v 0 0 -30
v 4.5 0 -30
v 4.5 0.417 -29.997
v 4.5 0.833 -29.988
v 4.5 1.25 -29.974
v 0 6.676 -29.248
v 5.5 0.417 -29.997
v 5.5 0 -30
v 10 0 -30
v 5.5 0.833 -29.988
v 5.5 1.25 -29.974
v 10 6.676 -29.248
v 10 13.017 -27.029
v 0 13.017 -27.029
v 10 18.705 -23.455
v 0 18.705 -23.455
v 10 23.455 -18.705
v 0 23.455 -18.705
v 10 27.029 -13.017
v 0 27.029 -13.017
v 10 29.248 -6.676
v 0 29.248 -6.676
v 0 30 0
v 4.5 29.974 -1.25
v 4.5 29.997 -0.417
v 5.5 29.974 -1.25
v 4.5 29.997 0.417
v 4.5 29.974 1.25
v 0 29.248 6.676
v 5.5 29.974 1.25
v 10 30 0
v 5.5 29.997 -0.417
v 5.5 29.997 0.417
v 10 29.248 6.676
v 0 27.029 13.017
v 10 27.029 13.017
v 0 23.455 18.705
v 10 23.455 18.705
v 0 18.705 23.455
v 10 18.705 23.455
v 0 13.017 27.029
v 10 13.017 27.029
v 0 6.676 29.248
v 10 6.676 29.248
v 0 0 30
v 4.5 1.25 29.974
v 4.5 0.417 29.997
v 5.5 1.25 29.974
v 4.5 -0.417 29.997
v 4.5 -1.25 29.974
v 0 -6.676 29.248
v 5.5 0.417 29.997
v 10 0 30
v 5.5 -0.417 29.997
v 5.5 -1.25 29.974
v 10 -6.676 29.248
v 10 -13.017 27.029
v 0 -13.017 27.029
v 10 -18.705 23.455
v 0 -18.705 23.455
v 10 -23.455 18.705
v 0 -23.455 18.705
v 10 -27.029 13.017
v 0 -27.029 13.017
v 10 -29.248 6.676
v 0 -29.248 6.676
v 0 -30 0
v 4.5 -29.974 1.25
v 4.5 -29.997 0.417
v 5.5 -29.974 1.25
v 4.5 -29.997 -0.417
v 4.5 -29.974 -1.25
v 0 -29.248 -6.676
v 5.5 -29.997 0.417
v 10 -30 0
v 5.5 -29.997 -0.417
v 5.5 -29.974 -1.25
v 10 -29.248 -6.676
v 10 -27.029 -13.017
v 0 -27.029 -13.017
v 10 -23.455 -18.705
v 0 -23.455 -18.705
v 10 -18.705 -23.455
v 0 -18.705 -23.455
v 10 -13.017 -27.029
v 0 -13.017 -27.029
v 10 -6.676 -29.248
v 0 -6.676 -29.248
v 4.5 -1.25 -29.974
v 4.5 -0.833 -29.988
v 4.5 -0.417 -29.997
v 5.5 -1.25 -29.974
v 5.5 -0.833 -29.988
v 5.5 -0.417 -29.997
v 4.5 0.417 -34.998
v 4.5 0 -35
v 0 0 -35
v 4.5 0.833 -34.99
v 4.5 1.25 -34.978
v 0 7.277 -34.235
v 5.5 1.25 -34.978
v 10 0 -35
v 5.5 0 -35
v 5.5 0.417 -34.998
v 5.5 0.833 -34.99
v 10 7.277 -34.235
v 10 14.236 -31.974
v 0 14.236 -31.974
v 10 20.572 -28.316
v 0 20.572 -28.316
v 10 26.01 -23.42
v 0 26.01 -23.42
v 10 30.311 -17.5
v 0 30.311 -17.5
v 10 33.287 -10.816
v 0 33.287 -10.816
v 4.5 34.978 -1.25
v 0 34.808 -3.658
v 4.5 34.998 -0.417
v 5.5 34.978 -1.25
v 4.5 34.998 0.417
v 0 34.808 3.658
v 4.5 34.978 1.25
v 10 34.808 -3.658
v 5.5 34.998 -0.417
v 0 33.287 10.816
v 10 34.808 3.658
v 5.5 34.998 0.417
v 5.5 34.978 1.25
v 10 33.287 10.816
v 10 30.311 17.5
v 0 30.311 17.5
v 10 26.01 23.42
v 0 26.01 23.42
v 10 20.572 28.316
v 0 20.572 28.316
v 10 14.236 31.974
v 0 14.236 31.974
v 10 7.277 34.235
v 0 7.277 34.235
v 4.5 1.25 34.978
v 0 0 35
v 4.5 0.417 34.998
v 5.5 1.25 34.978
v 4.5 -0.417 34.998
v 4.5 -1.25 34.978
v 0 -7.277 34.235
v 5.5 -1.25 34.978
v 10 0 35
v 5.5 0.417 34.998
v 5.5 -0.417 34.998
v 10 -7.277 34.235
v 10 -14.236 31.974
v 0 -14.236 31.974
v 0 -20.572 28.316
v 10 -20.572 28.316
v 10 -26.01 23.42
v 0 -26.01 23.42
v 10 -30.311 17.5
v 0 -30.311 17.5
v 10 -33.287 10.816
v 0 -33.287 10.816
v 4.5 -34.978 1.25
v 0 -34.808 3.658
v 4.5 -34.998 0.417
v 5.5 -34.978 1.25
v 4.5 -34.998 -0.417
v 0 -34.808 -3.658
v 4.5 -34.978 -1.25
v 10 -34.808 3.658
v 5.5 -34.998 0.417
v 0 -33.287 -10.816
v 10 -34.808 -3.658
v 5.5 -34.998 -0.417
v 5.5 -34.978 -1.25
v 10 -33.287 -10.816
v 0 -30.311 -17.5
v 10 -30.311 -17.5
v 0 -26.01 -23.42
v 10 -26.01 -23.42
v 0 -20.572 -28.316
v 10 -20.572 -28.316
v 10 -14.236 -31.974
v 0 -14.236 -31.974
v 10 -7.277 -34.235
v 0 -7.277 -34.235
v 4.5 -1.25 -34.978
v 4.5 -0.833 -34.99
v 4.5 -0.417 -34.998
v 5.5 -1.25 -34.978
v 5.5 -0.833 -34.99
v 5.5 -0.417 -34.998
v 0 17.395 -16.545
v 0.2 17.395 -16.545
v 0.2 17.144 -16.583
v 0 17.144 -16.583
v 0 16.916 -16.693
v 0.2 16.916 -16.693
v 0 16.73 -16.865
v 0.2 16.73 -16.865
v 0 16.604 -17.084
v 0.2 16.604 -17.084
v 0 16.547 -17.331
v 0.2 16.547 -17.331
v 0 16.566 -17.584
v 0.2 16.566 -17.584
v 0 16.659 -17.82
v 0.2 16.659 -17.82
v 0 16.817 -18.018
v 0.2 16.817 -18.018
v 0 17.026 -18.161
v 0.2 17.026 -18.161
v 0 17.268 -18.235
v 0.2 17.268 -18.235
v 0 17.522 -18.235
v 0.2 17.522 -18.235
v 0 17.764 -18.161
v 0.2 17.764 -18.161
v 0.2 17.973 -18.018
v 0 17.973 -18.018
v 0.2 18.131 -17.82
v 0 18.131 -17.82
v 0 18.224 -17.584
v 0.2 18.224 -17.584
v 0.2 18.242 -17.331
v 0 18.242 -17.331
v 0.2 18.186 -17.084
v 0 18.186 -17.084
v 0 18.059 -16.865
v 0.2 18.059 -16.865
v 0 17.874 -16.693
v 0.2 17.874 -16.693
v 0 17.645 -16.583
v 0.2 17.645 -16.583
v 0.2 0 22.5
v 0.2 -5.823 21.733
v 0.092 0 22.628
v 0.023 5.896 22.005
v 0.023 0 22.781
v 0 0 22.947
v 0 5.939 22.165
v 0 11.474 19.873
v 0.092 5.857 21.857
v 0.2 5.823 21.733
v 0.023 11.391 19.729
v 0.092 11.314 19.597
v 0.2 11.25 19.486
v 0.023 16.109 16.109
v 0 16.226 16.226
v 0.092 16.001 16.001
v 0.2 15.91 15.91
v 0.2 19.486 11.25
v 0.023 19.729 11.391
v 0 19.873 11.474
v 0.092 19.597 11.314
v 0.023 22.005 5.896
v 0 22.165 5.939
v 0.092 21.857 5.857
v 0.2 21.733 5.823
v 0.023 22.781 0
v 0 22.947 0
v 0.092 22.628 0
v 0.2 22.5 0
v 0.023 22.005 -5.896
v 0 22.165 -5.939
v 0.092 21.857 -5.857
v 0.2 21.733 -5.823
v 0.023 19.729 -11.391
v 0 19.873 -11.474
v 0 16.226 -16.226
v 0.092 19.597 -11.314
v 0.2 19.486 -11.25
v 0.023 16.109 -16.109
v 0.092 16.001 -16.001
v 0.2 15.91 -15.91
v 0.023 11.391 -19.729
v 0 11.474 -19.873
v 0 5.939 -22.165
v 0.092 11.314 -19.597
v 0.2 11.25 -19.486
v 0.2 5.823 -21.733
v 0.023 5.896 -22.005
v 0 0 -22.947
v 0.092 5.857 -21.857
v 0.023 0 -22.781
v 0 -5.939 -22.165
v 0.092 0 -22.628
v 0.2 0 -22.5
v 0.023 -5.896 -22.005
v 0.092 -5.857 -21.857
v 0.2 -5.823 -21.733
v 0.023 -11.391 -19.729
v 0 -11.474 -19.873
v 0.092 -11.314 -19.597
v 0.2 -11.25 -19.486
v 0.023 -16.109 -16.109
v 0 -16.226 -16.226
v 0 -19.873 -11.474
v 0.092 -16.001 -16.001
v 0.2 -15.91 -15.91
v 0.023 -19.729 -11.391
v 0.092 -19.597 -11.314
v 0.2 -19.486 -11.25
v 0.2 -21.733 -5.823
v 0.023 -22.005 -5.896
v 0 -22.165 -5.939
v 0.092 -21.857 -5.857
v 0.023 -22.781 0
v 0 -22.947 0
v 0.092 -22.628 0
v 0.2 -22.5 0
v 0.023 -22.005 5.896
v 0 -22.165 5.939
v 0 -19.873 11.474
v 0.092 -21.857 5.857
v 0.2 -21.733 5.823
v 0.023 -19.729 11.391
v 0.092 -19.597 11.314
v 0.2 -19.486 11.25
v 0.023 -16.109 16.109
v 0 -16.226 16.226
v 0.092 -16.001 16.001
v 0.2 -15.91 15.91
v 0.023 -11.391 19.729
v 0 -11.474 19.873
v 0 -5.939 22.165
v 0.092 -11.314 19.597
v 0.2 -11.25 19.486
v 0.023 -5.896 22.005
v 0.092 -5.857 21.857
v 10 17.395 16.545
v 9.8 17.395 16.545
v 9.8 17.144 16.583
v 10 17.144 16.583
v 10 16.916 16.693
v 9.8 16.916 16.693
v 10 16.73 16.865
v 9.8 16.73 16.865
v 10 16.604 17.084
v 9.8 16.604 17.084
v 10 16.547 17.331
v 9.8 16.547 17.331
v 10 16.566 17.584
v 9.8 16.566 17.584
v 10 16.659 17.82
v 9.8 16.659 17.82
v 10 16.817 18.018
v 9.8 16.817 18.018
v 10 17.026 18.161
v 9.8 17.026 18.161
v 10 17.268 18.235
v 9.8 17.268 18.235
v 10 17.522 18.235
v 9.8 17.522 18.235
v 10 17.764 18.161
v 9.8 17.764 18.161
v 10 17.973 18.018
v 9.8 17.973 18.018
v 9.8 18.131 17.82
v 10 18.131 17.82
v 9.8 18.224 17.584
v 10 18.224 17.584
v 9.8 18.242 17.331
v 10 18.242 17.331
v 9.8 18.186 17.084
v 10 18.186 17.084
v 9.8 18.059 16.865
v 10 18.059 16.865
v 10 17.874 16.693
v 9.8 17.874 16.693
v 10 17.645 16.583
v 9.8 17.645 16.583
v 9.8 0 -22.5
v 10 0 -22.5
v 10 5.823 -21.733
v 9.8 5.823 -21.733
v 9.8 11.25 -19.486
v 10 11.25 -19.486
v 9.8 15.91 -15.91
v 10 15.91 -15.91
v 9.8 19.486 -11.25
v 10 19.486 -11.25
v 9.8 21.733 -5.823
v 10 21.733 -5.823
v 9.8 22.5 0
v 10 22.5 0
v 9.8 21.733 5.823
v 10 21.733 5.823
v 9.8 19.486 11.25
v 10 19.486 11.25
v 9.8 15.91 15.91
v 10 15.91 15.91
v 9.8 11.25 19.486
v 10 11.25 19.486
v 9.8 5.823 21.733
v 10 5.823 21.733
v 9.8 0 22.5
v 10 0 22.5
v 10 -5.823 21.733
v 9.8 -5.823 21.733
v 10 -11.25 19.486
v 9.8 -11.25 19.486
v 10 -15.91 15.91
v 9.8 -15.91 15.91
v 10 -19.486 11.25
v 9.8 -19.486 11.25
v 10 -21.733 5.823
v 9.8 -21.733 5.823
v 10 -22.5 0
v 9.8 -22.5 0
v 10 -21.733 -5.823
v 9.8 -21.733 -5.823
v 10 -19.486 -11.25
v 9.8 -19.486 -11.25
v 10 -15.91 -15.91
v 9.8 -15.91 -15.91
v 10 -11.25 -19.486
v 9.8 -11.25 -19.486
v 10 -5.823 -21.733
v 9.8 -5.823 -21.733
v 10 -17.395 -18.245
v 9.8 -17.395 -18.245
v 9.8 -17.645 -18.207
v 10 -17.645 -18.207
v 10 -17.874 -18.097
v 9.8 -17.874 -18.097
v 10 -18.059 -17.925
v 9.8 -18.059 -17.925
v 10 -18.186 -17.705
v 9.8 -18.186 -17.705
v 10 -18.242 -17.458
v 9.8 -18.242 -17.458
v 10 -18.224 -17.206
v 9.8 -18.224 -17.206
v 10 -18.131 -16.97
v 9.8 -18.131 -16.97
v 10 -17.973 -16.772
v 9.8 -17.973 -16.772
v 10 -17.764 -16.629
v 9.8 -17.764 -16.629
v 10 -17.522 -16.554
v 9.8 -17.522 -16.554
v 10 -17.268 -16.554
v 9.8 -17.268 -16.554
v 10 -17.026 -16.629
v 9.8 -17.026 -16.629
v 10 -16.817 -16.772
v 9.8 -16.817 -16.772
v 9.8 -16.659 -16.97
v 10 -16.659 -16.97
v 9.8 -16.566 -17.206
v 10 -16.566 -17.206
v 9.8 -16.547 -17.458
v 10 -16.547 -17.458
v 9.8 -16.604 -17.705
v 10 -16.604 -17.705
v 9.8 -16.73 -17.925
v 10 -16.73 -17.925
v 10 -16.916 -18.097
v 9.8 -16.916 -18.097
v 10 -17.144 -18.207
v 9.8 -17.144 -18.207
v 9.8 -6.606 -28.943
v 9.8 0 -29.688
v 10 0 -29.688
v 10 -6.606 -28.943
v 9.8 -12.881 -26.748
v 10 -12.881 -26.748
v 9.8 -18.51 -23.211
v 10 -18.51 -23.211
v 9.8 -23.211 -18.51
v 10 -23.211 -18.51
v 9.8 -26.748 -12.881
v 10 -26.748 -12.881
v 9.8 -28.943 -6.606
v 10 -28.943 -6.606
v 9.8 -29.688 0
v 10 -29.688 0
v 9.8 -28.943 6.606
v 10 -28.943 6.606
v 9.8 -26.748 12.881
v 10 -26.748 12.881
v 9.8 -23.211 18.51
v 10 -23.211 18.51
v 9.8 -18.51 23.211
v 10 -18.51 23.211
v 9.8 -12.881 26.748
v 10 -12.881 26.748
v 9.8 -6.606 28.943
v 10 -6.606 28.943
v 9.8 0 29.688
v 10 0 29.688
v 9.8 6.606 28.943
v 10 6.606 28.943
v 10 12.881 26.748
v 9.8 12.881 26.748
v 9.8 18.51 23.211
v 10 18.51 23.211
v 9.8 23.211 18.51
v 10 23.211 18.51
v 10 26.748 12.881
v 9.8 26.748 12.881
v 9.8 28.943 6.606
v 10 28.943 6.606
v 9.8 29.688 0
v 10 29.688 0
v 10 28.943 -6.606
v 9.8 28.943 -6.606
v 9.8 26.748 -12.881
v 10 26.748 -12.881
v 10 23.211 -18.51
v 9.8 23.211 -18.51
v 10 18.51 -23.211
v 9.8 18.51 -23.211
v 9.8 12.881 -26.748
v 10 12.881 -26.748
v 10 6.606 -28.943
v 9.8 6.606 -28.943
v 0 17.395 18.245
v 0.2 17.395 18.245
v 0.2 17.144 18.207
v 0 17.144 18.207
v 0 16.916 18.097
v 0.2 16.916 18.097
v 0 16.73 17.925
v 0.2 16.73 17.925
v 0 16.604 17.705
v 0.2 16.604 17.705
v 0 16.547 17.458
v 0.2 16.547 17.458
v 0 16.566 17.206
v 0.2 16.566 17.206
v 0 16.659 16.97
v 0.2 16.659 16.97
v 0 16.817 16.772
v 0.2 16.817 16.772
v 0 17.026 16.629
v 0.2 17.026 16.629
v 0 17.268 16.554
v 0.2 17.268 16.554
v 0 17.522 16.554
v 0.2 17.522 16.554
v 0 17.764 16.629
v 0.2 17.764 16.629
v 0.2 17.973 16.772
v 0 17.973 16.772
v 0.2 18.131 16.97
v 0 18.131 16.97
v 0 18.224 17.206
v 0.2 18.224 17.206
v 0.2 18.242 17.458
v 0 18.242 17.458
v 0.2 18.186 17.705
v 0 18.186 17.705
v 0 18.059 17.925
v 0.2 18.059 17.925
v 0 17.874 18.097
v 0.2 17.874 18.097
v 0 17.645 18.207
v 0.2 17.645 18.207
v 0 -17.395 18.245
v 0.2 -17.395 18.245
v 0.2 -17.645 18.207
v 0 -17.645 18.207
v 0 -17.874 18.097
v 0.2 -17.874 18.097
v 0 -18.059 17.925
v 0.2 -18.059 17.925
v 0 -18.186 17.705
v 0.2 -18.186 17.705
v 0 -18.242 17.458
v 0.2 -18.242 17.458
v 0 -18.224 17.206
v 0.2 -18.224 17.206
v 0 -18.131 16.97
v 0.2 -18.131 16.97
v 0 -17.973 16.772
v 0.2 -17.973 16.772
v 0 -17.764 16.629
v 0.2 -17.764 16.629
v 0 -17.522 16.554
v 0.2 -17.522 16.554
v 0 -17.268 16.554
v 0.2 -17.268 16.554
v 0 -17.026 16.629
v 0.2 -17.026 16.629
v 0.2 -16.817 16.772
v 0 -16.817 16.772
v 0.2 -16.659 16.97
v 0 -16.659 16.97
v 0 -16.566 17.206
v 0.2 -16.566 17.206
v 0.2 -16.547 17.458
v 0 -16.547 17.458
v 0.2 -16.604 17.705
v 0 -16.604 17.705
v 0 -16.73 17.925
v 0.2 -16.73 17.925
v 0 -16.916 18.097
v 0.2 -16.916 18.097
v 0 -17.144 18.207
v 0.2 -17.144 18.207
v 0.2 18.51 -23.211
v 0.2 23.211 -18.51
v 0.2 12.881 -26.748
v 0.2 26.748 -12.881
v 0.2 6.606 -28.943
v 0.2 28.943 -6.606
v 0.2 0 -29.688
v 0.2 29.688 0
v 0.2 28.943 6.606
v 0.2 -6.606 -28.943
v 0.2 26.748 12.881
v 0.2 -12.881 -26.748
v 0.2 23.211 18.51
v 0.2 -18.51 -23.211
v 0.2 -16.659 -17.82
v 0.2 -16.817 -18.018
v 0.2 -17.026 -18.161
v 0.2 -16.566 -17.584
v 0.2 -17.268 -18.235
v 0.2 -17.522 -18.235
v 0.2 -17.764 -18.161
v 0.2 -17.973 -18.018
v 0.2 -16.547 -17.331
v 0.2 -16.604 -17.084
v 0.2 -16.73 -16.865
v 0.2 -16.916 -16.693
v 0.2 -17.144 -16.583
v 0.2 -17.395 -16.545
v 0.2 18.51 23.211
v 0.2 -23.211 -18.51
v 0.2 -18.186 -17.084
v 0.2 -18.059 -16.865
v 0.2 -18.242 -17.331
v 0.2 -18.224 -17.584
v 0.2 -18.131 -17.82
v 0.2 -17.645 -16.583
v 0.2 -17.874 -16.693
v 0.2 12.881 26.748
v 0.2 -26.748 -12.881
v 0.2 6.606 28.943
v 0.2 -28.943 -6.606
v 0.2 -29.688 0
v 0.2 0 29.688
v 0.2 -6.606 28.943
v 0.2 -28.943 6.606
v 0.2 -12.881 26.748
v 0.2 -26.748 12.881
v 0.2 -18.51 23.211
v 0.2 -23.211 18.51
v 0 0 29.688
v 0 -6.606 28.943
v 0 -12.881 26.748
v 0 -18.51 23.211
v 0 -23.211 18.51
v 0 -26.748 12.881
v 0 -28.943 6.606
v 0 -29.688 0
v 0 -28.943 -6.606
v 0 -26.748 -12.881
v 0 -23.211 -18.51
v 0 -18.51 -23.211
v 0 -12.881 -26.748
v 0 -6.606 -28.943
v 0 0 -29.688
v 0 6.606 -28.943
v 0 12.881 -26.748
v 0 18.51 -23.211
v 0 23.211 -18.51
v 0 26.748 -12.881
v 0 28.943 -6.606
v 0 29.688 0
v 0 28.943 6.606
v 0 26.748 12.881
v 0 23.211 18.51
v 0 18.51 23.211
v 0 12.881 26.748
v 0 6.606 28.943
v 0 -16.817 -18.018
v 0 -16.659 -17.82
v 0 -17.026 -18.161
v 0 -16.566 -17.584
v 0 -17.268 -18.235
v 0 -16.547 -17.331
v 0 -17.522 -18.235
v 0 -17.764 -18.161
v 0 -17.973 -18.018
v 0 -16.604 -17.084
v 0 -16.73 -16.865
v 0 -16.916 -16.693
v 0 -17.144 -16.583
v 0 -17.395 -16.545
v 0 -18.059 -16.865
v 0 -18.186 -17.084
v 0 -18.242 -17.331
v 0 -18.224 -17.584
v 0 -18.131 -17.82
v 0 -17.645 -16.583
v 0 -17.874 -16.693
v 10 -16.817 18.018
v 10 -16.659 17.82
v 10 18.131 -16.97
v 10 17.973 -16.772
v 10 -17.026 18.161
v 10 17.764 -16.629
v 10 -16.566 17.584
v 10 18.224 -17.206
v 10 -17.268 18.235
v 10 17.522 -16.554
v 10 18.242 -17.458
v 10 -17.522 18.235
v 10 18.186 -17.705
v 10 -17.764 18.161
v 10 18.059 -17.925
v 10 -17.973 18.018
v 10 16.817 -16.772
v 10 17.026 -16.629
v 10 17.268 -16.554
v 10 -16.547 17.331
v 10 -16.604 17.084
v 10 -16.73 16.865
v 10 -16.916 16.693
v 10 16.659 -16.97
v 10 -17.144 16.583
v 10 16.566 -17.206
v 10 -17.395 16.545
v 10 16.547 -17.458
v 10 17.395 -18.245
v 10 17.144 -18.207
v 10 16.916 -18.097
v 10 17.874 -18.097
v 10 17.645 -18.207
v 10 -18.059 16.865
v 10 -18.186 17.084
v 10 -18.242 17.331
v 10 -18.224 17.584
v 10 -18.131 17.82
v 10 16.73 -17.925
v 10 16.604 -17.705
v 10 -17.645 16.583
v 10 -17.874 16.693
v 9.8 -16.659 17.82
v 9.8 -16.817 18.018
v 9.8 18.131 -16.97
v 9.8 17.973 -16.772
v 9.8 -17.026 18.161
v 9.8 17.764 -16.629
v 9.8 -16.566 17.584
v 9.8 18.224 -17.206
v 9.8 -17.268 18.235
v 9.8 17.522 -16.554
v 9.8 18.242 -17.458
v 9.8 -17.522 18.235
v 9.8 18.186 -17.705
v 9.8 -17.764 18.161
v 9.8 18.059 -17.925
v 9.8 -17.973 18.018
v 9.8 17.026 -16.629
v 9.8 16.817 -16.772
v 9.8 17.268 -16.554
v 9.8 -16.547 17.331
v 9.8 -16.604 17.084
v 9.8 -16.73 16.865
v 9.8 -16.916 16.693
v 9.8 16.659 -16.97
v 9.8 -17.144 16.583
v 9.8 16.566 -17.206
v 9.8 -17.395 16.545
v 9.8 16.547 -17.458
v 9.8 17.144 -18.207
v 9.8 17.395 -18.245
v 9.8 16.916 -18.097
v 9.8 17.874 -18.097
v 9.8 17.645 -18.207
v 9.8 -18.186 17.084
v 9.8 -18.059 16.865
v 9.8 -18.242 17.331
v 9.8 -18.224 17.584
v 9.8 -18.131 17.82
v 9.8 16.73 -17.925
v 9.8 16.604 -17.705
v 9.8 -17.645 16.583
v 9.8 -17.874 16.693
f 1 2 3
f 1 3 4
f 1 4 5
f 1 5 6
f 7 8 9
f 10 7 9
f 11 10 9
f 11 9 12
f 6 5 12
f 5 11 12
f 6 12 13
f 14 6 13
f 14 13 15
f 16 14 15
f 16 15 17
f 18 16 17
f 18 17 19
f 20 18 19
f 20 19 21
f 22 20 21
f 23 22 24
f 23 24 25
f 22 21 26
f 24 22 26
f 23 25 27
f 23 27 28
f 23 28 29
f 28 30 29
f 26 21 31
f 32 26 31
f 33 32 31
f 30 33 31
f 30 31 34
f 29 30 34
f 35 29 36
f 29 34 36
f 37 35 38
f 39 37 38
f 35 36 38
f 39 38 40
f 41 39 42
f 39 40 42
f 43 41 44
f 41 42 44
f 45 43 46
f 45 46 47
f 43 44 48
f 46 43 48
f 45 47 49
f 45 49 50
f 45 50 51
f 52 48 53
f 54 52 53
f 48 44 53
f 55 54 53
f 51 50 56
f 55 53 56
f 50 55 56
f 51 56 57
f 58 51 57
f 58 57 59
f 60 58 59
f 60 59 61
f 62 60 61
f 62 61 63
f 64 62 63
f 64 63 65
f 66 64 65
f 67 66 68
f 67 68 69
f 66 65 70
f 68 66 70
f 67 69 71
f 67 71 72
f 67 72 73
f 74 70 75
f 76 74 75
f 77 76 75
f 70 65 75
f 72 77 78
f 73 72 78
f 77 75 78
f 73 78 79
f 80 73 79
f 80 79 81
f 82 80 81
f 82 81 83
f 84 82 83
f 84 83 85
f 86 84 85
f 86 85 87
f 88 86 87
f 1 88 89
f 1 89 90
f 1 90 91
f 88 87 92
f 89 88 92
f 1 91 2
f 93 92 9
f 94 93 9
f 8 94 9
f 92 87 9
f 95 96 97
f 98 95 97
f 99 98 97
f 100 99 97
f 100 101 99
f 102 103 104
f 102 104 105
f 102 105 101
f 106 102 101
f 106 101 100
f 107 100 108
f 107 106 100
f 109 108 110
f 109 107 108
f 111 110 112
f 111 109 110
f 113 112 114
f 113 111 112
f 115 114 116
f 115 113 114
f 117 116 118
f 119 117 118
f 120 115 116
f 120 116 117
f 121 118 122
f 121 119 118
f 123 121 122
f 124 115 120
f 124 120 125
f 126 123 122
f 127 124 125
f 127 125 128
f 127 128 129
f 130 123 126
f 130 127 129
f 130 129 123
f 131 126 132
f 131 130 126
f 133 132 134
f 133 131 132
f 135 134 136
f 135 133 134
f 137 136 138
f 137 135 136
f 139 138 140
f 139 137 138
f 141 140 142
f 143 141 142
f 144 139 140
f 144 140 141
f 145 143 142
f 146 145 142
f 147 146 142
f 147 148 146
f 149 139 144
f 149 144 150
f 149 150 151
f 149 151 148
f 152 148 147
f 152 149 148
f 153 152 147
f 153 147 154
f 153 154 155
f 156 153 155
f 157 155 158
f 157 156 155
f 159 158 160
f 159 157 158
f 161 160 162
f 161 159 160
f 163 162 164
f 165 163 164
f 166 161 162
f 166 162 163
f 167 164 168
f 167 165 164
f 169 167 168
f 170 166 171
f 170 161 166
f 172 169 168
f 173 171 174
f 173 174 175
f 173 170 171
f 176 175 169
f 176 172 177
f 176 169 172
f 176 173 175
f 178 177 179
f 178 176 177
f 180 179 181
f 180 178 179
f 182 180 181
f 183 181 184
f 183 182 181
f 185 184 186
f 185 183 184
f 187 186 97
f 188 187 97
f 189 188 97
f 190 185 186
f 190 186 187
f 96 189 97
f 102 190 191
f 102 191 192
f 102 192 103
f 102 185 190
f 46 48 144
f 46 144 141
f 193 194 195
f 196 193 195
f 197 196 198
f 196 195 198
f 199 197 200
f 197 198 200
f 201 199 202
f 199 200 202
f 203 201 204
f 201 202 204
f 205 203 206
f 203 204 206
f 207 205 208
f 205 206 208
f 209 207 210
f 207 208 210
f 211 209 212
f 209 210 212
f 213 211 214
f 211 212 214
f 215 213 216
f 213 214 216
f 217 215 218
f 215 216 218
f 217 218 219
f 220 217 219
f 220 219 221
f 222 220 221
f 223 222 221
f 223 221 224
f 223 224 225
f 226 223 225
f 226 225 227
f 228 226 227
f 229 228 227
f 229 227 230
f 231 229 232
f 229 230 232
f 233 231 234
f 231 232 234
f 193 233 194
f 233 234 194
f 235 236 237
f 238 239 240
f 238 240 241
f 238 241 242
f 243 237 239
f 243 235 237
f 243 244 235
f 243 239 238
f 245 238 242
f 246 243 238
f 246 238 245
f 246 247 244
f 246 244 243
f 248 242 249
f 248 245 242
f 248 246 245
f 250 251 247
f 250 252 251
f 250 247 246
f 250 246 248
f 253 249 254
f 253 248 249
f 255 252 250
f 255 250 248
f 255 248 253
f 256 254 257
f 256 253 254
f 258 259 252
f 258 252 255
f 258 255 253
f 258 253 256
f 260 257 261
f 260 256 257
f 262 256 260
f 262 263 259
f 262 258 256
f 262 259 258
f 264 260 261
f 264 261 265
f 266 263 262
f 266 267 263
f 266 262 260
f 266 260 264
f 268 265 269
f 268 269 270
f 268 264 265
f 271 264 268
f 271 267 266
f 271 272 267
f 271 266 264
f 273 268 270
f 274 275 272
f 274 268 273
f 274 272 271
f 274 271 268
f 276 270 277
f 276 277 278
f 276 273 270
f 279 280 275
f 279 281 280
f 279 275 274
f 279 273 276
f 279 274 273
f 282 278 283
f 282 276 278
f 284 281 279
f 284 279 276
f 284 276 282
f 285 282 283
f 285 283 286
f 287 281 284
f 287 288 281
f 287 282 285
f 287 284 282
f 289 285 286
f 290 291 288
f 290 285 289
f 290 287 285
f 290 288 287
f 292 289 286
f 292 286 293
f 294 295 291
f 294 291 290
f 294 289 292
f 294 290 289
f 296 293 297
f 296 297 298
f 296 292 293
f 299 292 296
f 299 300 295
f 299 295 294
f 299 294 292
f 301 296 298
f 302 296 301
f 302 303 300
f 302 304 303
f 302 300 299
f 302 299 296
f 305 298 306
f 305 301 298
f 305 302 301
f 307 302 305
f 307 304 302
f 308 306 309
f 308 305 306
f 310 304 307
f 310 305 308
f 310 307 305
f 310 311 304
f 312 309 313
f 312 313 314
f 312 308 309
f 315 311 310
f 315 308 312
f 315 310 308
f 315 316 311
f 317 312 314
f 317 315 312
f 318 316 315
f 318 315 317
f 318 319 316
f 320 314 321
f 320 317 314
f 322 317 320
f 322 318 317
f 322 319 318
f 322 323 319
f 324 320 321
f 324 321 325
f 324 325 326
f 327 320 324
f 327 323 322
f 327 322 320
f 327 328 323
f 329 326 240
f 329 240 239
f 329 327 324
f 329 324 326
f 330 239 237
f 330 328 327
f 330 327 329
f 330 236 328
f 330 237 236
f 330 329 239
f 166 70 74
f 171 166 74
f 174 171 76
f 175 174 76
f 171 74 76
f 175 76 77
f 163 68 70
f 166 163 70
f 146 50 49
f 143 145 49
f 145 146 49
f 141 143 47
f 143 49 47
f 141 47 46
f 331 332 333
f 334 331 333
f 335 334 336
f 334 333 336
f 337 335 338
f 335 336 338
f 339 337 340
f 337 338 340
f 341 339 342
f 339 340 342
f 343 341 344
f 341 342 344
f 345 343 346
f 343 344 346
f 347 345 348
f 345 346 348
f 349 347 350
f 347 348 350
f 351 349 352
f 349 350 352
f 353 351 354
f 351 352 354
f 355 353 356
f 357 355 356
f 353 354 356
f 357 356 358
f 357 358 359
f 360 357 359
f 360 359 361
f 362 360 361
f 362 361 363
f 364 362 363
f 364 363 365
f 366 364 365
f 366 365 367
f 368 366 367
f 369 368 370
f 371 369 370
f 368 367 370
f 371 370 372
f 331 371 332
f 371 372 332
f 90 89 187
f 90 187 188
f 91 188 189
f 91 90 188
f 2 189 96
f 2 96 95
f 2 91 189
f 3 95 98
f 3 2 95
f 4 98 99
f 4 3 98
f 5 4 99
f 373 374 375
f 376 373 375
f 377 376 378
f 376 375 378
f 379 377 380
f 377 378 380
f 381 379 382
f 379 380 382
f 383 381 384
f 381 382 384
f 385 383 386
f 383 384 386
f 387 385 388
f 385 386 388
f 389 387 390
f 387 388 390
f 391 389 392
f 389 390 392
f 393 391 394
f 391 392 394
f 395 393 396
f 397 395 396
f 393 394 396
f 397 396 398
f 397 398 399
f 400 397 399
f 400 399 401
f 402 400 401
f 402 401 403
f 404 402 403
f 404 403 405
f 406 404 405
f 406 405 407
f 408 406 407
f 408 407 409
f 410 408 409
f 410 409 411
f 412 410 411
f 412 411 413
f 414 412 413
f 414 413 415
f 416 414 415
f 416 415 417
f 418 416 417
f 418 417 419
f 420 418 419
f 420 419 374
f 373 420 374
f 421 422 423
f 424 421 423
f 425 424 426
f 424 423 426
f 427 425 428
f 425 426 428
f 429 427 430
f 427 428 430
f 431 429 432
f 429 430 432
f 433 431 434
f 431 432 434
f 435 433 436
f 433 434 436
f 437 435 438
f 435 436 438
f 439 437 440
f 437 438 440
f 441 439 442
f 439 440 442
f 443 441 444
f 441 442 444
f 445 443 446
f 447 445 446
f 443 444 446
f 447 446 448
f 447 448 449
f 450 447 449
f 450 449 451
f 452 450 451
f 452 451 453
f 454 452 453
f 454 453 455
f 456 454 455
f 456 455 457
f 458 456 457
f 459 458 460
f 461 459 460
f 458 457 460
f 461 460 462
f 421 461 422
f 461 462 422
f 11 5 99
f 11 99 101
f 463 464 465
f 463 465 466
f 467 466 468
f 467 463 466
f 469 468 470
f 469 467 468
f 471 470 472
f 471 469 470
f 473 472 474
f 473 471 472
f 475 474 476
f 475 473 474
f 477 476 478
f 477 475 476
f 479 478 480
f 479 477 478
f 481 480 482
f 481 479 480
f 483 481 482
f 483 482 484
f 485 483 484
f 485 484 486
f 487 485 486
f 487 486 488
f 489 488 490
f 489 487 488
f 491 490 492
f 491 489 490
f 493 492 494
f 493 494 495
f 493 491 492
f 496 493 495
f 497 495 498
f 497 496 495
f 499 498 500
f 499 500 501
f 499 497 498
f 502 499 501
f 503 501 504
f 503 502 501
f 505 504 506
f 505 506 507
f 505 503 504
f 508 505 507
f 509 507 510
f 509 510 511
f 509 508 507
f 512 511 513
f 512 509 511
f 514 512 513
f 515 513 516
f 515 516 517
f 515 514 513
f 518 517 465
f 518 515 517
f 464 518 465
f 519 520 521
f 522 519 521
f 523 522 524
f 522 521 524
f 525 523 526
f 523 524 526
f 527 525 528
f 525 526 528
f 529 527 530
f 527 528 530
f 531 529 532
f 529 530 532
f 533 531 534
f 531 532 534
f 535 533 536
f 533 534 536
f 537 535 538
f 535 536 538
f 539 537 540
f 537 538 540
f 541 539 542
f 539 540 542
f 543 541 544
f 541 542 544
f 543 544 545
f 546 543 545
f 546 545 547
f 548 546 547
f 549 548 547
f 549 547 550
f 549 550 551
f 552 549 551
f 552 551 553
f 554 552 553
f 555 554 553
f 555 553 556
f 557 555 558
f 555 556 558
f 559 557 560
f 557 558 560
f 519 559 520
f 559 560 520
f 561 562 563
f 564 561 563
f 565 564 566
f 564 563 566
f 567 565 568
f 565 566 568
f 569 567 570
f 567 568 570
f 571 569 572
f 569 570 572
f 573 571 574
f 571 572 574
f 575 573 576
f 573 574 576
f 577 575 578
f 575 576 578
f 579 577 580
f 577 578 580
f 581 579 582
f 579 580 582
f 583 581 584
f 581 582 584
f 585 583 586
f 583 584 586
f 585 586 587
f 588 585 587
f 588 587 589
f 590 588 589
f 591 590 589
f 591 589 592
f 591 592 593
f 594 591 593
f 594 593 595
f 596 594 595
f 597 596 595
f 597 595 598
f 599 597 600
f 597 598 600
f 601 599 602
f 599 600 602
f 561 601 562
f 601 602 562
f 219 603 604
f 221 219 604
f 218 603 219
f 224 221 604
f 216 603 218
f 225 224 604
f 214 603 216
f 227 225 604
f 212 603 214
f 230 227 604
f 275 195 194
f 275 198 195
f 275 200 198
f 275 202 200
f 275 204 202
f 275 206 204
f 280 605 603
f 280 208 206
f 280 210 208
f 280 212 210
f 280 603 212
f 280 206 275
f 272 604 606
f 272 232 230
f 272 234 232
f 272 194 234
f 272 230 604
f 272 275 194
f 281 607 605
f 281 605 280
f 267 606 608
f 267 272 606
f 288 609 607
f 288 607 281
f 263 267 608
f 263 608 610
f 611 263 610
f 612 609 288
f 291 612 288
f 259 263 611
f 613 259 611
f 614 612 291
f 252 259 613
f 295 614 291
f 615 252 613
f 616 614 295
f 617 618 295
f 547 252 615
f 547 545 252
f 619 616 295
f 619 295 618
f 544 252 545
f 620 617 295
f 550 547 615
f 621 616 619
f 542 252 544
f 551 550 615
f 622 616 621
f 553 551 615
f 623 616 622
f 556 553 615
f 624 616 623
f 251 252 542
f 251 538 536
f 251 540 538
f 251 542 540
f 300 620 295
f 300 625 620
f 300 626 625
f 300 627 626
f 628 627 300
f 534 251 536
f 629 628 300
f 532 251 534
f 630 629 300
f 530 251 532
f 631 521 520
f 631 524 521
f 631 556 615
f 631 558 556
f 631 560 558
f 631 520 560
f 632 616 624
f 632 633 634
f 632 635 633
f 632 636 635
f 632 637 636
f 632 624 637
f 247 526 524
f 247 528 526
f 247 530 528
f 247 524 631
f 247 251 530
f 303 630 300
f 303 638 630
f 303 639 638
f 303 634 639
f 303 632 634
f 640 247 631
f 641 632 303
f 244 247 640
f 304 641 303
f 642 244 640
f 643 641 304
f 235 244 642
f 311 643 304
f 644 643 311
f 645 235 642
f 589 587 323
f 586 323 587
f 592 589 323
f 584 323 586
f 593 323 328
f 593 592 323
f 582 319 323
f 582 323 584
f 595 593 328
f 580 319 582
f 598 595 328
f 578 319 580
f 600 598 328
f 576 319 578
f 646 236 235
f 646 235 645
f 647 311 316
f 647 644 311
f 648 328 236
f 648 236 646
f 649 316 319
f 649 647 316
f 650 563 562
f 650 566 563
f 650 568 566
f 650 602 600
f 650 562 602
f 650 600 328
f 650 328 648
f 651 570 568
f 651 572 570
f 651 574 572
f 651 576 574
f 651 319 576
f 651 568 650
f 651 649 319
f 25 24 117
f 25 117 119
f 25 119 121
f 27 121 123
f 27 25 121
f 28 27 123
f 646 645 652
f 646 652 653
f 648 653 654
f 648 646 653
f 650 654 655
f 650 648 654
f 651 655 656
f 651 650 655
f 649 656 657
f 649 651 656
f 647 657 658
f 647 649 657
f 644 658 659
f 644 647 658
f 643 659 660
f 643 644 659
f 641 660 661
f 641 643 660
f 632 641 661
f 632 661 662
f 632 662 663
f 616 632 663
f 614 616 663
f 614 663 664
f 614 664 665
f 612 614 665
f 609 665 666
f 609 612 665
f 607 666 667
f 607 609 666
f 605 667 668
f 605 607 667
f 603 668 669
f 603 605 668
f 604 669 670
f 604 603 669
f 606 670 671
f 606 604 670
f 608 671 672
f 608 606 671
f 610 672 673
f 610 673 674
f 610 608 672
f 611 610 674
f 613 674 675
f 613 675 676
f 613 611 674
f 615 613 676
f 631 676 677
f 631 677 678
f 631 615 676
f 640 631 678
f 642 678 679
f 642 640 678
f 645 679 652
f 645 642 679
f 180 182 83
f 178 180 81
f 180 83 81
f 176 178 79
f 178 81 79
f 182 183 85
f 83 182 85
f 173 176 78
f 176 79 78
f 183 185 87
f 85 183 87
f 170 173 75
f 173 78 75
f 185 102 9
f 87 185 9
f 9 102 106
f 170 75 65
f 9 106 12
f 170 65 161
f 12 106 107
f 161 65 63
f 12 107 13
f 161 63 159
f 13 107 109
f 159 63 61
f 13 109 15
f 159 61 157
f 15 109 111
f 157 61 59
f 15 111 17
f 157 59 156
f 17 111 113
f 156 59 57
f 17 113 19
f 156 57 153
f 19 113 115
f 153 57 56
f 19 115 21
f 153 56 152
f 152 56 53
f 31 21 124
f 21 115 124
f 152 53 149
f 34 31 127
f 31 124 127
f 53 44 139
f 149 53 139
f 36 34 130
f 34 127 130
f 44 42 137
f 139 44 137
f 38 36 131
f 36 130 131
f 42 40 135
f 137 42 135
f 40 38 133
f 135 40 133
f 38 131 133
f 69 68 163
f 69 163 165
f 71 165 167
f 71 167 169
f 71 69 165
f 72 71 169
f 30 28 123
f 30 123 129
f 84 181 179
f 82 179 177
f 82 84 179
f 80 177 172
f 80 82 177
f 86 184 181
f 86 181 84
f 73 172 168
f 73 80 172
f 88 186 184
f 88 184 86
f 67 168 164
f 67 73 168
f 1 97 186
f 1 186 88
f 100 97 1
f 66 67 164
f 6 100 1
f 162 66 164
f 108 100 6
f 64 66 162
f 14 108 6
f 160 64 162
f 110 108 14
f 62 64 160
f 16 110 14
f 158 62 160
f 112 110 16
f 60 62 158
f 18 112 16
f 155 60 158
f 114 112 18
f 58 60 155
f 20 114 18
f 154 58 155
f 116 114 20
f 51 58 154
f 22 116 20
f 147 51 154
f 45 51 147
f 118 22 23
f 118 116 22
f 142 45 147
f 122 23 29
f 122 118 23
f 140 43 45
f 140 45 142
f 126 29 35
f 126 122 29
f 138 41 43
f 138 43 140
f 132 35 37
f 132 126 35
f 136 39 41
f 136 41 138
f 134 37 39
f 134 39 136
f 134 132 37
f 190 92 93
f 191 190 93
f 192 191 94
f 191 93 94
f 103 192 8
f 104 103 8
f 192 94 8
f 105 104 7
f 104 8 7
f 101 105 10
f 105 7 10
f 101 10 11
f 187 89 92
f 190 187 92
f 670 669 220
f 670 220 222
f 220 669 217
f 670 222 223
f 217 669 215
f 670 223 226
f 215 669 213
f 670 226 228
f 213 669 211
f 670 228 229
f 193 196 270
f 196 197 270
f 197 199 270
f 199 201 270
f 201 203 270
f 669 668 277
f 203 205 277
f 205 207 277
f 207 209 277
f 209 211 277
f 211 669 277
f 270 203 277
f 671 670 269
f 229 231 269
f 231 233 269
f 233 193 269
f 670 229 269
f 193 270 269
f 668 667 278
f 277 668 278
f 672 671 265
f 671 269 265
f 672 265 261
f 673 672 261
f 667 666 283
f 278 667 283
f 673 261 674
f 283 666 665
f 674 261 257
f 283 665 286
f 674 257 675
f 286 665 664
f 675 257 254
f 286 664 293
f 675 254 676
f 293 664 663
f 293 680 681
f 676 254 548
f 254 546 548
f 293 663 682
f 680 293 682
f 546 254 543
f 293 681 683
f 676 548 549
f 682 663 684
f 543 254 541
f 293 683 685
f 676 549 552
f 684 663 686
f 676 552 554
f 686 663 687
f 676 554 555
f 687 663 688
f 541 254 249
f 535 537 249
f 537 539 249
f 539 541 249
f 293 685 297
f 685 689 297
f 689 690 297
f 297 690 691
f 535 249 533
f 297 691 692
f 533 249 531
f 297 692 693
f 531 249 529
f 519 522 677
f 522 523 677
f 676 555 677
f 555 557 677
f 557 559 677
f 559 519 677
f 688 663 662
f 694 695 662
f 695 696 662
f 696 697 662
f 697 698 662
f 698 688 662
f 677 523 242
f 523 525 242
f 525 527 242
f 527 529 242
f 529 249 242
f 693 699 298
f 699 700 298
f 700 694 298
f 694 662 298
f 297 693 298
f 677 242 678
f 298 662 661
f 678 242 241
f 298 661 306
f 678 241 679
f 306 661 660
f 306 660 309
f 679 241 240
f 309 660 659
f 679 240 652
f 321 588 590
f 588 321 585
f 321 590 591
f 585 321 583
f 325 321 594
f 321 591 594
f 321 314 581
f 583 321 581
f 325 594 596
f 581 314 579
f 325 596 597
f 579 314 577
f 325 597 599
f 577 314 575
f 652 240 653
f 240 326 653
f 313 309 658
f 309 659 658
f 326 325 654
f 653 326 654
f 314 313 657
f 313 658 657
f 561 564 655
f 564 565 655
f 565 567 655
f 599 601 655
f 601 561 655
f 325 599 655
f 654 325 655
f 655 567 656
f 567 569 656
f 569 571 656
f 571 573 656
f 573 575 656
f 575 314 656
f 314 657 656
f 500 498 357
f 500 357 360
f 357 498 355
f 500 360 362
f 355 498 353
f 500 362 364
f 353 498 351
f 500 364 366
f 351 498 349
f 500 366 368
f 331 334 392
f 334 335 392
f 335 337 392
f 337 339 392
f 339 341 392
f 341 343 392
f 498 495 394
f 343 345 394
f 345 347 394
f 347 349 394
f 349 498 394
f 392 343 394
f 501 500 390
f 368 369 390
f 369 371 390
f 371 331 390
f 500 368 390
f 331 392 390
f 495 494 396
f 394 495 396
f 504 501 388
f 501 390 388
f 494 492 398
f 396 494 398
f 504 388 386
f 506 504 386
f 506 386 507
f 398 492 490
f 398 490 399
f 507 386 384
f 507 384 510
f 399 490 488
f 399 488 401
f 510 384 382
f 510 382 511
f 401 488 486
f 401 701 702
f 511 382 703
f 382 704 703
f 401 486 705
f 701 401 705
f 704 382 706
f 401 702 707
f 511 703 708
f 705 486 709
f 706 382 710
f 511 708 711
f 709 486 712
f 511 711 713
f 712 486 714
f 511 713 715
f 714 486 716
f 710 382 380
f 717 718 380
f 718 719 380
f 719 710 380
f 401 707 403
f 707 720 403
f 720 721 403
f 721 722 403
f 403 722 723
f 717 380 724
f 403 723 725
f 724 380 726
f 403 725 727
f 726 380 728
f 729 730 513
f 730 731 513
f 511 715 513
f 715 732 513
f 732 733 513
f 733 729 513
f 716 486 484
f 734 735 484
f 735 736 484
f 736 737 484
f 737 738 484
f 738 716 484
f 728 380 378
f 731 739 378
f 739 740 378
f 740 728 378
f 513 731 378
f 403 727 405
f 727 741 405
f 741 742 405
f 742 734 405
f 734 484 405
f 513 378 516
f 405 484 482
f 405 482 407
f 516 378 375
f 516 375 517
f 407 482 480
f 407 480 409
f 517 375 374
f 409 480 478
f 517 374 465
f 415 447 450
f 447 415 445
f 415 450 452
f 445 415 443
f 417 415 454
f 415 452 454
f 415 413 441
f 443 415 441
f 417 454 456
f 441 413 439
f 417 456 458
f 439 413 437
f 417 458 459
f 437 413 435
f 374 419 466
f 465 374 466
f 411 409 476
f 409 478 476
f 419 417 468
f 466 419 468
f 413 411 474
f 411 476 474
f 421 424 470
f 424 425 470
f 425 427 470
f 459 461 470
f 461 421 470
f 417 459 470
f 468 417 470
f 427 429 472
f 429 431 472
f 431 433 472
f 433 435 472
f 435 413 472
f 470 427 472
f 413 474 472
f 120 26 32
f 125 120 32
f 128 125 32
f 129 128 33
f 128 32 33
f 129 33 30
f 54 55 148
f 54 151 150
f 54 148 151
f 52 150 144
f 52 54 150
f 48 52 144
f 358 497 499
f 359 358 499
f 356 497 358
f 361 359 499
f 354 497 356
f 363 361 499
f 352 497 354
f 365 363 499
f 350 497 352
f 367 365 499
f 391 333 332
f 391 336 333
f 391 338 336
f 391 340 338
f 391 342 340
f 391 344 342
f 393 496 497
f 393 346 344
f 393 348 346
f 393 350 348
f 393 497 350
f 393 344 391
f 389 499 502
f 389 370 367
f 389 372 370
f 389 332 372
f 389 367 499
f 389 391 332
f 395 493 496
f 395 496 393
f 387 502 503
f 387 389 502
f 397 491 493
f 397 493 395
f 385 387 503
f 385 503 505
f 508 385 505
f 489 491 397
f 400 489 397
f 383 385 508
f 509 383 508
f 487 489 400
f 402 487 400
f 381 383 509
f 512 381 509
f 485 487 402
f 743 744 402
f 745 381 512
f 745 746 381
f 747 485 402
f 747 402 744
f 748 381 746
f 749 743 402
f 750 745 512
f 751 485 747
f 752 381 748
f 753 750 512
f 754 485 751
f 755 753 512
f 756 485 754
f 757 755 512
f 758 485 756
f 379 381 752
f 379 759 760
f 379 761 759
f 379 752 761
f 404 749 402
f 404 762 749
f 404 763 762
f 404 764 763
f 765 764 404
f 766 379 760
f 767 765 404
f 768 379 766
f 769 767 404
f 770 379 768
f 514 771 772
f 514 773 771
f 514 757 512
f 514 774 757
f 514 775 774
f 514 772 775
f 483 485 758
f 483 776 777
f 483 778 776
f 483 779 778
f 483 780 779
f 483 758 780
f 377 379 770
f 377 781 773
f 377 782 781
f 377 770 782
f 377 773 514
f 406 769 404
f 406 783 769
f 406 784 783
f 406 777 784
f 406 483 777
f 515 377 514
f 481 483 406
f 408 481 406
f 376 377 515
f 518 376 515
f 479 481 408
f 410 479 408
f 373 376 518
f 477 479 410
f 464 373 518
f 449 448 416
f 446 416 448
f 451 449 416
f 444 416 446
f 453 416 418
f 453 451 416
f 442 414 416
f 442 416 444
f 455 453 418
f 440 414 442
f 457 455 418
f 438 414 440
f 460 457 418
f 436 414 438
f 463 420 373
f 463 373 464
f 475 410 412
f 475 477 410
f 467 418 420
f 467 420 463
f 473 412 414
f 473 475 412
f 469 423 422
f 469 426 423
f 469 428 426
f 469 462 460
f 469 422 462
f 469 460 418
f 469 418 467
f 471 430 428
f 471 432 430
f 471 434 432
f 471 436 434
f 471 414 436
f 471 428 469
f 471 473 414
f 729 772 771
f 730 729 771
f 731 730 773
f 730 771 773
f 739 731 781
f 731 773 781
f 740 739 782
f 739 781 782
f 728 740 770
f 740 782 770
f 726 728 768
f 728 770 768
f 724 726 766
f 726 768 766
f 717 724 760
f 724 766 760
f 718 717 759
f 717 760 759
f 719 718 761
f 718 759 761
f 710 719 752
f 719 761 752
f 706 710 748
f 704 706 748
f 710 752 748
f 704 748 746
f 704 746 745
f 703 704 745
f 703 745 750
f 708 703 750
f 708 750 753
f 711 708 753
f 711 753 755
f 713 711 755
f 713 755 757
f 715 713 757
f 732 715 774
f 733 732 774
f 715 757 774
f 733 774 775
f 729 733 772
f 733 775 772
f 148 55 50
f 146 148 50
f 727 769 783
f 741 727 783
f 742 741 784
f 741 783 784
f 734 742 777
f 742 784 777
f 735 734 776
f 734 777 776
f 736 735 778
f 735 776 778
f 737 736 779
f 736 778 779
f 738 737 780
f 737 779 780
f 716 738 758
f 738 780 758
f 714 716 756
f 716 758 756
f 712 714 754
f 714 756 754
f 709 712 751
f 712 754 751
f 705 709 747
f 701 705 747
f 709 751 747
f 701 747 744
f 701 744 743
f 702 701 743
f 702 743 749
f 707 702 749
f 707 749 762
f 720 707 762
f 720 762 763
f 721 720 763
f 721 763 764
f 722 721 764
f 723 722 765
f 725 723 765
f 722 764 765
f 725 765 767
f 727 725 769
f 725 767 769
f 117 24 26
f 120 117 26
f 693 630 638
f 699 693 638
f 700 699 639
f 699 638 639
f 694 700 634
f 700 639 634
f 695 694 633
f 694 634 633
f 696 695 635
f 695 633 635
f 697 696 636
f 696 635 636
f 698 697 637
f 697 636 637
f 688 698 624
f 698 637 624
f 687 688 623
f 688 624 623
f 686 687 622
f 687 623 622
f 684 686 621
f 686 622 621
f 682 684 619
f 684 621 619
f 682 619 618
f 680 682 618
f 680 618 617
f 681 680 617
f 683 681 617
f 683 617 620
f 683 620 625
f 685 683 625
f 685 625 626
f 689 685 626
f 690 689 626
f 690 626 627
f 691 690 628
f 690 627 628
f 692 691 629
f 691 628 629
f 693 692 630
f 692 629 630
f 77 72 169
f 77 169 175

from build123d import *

# Parameters (mm, degrees)
SKETCH_1_W                       = 10
SKETCH_1_H                       = 35
HOLE_WIZARD_M52_1_D              = 60
SKETCH_4_R                       = 29.6875
EXTRUDE_1_DEPTH                  = 0.2
SKETCH_6_R                       = 29.6875
EXTRUDE_2_DEPTH                  = 0.2
SKETCH_7_R                       = 22.5
CUT_EXTRUDE_1_DEPTH              = 3.333333333
SKETCH_10_R                      = 22.5
CUT_EXTRUDE_4_DEPTH              = 3.333333333
CUT_EXTRUDE_5_REACH              = 73.609
CUT_EXTRUDE_5_END_RADIUS         = 35
SKETCH_11_W                      = 1
SKETCH_11_H                      = 2.5
CUT_EXTRUDE_6_REACH              = 73.609
CUT_EXTRUDE_6_END_RADIUS         = 35
SKETCH_12_W                      = 1
SKETCH_12_H                      = 2.5
CUT_EXTRUDE_7_REACH              = 73.609
CUT_EXTRUDE_7_END_RADIUS         = 35
SKETCH_13_W                      = 1
SKETCH_13_H                      = 2.5
CUT_EXTRUDE_8_REACH              = 73.609
CUT_EXTRUDE_8_END_RADIUS         = 35
SKETCH_14_W                      = 1
SKETCH_14_H                      = 2.5
SKETCH_15_W                      = 0.85
SKETCH_15_H                      = 0.85
HOLE_WIZARD_1_7_1_7_1_AT_2_COUNT = 2
HOLE_WIZARD_1_7_1_7_1_AT_2_PITCH = 34.789653634
HOLE_WIZARD_1_7_1_7_1_AT_3_COUNT = 2
HOLE_WIZARD_1_7_1_7_1_AT_3_PITCH = 49.2
HOLE_WIZARD_1_7_1_7_1_AT_4_COUNT = 2
HOLE_WIZARD_1_7_1_7_1_AT_4_PITCH = 34.789653634
SKETCH_17_W                      = 0.85
SKETCH_17_H                      = 0.85
HOLE_WIZARD_1_7_1_7_2_AT_2_COUNT = 2
HOLE_WIZARD_1_7_1_7_2_AT_2_PITCH = 34.789653634
HOLE_WIZARD_1_7_1_7_2_AT_3_COUNT = 2
HOLE_WIZARD_1_7_1_7_2_AT_3_PITCH = 49.2
HOLE_WIZARD_1_7_1_7_2_AT_4_COUNT = 2
HOLE_WIZARD_1_7_1_7_2_AT_4_PITCH = 34.789653634
FILLET_2_R                       = 0.6


with BuildPart() as part:
    # 草图1 → 旋转1 (revolve)
    with BuildSketch(Plane.XY, mode=Mode.PRIVATE) as revolve_1_sk:
        with Locations((5, 17.5)):
            Rectangle(SKETCH_1_W, SKETCH_1_H)
    revolve(revolve_1_sk.sketch.rotate(Axis((0, 0, 0), (1, 0, 0)), 270), axis=Axis((0, 0, 0), (1, 0, 0)))

    # M52 间隙孔1 (through all)
    with Locations(Plane.ZY):
        with Locations((0, 0)):
            Hole(HOLE_WIZARD_M52_1_D / 2)

    # 切除-拉伸5: up to this cylinder (the profile starts inside it)
    cut_extrude_5_end = Plane(origin=(5, 0, 0), z_dir=(1, 0, 0)) * Cylinder(CUT_EXTRUDE_5_END_RADIUS, 218.218, mode=Mode.PRIVATE)
    # 草图11 → 切除-拉伸5 (cut, up to the surface)
    with BuildSketch(Plane.XY.offset(26.666666667), mode=Mode.PRIVATE) as cut_extrude_5_sk1:
        with Locations((5, 0)):
            Rectangle(SKETCH_11_W, SKETCH_11_H)
    cut_extrude_5_tool1 = extrude(cut_extrude_5_sk1.sketch, amount=-CUT_EXTRUDE_5_REACH, mode=Mode.PRIVATE) & cut_extrude_5_end
    add(cut_extrude_5_tool1.solids().sort_by_distance((5, 0, 26.666667))[0], mode=Mode.SUBTRACT)

    # 切除-拉伸6: up to this cylinder (the profile starts inside it)
    cut_extrude_6_end = Plane(origin=(5, 0, 0), z_dir=(1, 0, 0)) * Cylinder(CUT_EXTRUDE_6_END_RADIUS, 218.218, mode=Mode.PRIVATE)
    # 草图12 → 切除-拉伸6 (cut, up to the surface)
    with BuildSketch(Plane(origin=(0, 0, -26.666666667), x_dir=(-1, 0, 0), z_dir=(0, 0, -1)), mode=Mode.PRIVATE) as cut_extrude_6_sk1:
        with Locations((-5, 0)):
            Rectangle(SKETCH_12_W, SKETCH_12_H)
    cut_extrude_6_tool1 = extrude(cut_extrude_6_sk1.sketch, amount=-CUT_EXTRUDE_6_REACH, mode=Mode.PRIVATE) & cut_extrude_6_end
    add(cut_extrude_6_tool1.solids().sort_by_distance((5, 0, -26.666667))[0], mode=Mode.SUBTRACT)

    # 切除-拉伸7: up to this cylinder (the profile starts inside it)
    cut_extrude_7_end = Plane(origin=(5, 0, 0), z_dir=(1, 0, 0)) * Cylinder(CUT_EXTRUDE_7_END_RADIUS, 218.218, mode=Mode.PRIVATE)
    # 草图13 → 切除-拉伸7 (cut, up to the surface)
    with BuildSketch(Plane.XZ.offset(26.666666667), mode=Mode.PRIVATE) as cut_extrude_7_sk1:
        with Locations((5, 0)):
            Rectangle(SKETCH_13_W, SKETCH_13_H)
    cut_extrude_7_tool1 = extrude(cut_extrude_7_sk1.sketch, amount=-CUT_EXTRUDE_7_REACH, mode=Mode.PRIVATE) & cut_extrude_7_end
    add(cut_extrude_7_tool1.solids().sort_by_distance((5, -26.666667, 0))[0], mode=Mode.SUBTRACT)

    # 切除-拉伸8: up to this cylinder (the profile starts inside it)
    cut_extrude_8_end = Plane(origin=(5, 0, 0), z_dir=(1, 0, 0)) * Cylinder(CUT_EXTRUDE_8_END_RADIUS, 218.218, mode=Mode.PRIVATE)
    # 草图14 → 切除-拉伸8 (cut, up to the surface)
    with BuildSketch(Plane(origin=(0, 26.666666667, 0), x_dir=(1, 0, 0), z_dir=(0, 1, 0)), mode=Mode.PRIVATE) as cut_extrude_8_sk1:
        with Locations((5, 0)):
            Rectangle(SKETCH_14_W, SKETCH_14_H)
    cut_extrude_8_tool1 = extrude(cut_extrude_8_sk1.sketch, amount=-CUT_EXTRUDE_8_REACH, mode=Mode.PRIVATE) & cut_extrude_8_end
    add(cut_extrude_8_tool1.solids().sort_by_distance((5, 26.666667, 0))[0], mode=Mode.SUBTRACT)


with BuildPart() as body_2:
    # 草图4 → 凸台-拉伸1 (new body)
    with BuildSketch(Plane(origin=(0.2, 0, 0), x_dir=(0, 0, -1), z_dir=(1, 0, 0))):
        with Locations(Location((0, 0, 0), (0, 0, 180))):
            Circle(SKETCH_4_R)
    extrude(amount=-EXTRUDE_1_DEPTH)

    # 草图7 → 切除-拉伸1 (cut)
    with BuildSketch(Plane.ZY):
        Circle(SKETCH_7_R)
    extrude(amount=-CUT_EXTRUDE_1_DEPTH, mode=Mode.SUBTRACT)

    # 草图17 → Ø1.7 (1.7) 直径孔2 (revolve, cut)
    with BuildSketch(Plane(origin=(0, 17.394826817, 17.394826817), x_dir=(0, 0, 1), z_dir=(0, 1, 0))):
        with Locations((0.425, 0.425)):
            Rectangle(SKETCH_17_W, SKETCH_17_H)
    hole_wizard_1_7_1_7_2 = revolve(axis=Axis((-6.35, 17.394826817, 17.394826817), (1, 0, 0)), mode=Mode.SUBTRACT)

    # Ø1.7 (1.7) 直径孔2 at 2: Ø1.7 (1.7) 直径孔2 ×2
    with Locations(*[(0, -i * HOLE_WIZARD_1_7_1_7_2_AT_2_PITCH, 0) for i in range(1, HOLE_WIZARD_1_7_1_7_2_AT_2_COUNT)]):
        add(hole_wizard_1_7_1_7_2, mode=Mode.SUBTRACT)

    # Ø1.7 (1.7) 直径孔2 at 3: Ø1.7 (1.7) 直径孔2 ×2
    with Locations(*[Vector(0, -0.7071067811865476, -0.7071067811865475) * (i * HOLE_WIZARD_1_7_1_7_2_AT_3_PITCH) for i in range(1, HOLE_WIZARD_1_7_1_7_2_AT_3_COUNT)]):
        add(hole_wizard_1_7_1_7_2, mode=Mode.SUBTRACT)

    # Ø1.7 (1.7) 直径孔2 at 4: Ø1.7 (1.7) 直径孔2 ×2
    with Locations(*[(0, 0, -i * HOLE_WIZARD_1_7_1_7_2_AT_4_PITCH) for i in range(1, HOLE_WIZARD_1_7_1_7_2_AT_4_COUNT)]):
        add(hole_wizard_1_7_1_7_2, mode=Mode.SUBTRACT)

    # 圆角2
    # the kernel refuses this fillet: 0.6 mm, written as the material it takes off along each edge
    with BuildSketch(Plane(origin=(0, 0, 0), x_dir=(0, 0, 1), z_dir=(0, -1, 0))) as fillet_2_piece_1:
        with BuildLine():
            CenterArc((22.947213595, -0.6), FILLET_2_R, 90, 48.189685104)
            Line((22.5, -0.2), (22.491055728, -0.192))
            ThreePointArc((22.491055728, -0.192), (22.488, -0.1), (22.488, 0))
            Line((22.488, 0), (22.5, 0.012))
            Line((22.5, 0.012), (22.947213595, 0.012))
            Line((22.947213595, 0.012), (22.947213595, 0))
        make_face()
    revolve(axis=Axis((0, 0, 0), (-1, 0, 0)), mode=Mode.SUBTRACT)


with BuildPart() as body_3:
    # 草图6 → 凸台-拉伸2 (new body)
    with BuildSketch(Plane(origin=(9.8, 0, 0), x_dir=(0, -1, 0), z_dir=(-1, 0, 0))):
        with Locations(Location((0, 0, 0), (0, 0, 270))):
            Circle(SKETCH_6_R)
    extrude(amount=-EXTRUDE_2_DEPTH)

    # 草图10 → 切除-拉伸4 (cut)
    with BuildSketch(Plane(origin=(10, 0, 0), x_dir=(0, 0, -1), z_dir=(1, 0, 0))):
        Circle(SKETCH_10_R)
    extrude(amount=-CUT_EXTRUDE_4_DEPTH, mode=Mode.SUBTRACT)

    # 草图15 → Ø1.7 (1.7) 直径孔1 (revolve, cut)
    with BuildSketch(Plane(origin=(10, 17.394826817, 17.394826817), x_dir=(0, 0, -1), z_dir=(0, 1, 0))):
        with Locations((0.425, 0.425)):
            Rectangle(SKETCH_15_W, SKETCH_15_H)
    hole_wizard_1_7_1_7_1 = revolve(axis=Axis((16.35, 17.394826817, 17.394826817), (-1, 0, 0)), mode=Mode.SUBTRACT)

    # Ø1.7 (1.7) 直径孔1 at 2: Ø1.7 (1.7) 直径孔1 ×2
    with Locations(*[(0, -i * HOLE_WIZARD_1_7_1_7_1_AT_2_PITCH, 0) for i in range(1, HOLE_WIZARD_1_7_1_7_1_AT_2_COUNT)]):
        add(hole_wizard_1_7_1_7_1, mode=Mode.SUBTRACT)

    # Ø1.7 (1.7) 直径孔1 at 3: Ø1.7 (1.7) 直径孔1 ×2
    with Locations(*[Vector(0, -0.7071067811865476, -0.7071067811865475) * (i * HOLE_WIZARD_1_7_1_7_1_AT_3_PITCH) for i in range(1, HOLE_WIZARD_1_7_1_7_1_AT_3_COUNT)]):
        add(hole_wizard_1_7_1_7_1, mode=Mode.SUBTRACT)

    # Ø1.7 (1.7) 直径孔1 at 4: Ø1.7 (1.7) 直径孔1 ×2
    with Locations(*[(0, 0, -i * HOLE_WIZARD_1_7_1_7_1_AT_4_PITCH) for i in range(1, HOLE_WIZARD_1_7_1_7_1_AT_4_COUNT)]):
        add(hole_wizard_1_7_1_7_1, mode=Mode.SUBTRACT)


solid = Compound([part.part, body_2.part, body_3.part])
